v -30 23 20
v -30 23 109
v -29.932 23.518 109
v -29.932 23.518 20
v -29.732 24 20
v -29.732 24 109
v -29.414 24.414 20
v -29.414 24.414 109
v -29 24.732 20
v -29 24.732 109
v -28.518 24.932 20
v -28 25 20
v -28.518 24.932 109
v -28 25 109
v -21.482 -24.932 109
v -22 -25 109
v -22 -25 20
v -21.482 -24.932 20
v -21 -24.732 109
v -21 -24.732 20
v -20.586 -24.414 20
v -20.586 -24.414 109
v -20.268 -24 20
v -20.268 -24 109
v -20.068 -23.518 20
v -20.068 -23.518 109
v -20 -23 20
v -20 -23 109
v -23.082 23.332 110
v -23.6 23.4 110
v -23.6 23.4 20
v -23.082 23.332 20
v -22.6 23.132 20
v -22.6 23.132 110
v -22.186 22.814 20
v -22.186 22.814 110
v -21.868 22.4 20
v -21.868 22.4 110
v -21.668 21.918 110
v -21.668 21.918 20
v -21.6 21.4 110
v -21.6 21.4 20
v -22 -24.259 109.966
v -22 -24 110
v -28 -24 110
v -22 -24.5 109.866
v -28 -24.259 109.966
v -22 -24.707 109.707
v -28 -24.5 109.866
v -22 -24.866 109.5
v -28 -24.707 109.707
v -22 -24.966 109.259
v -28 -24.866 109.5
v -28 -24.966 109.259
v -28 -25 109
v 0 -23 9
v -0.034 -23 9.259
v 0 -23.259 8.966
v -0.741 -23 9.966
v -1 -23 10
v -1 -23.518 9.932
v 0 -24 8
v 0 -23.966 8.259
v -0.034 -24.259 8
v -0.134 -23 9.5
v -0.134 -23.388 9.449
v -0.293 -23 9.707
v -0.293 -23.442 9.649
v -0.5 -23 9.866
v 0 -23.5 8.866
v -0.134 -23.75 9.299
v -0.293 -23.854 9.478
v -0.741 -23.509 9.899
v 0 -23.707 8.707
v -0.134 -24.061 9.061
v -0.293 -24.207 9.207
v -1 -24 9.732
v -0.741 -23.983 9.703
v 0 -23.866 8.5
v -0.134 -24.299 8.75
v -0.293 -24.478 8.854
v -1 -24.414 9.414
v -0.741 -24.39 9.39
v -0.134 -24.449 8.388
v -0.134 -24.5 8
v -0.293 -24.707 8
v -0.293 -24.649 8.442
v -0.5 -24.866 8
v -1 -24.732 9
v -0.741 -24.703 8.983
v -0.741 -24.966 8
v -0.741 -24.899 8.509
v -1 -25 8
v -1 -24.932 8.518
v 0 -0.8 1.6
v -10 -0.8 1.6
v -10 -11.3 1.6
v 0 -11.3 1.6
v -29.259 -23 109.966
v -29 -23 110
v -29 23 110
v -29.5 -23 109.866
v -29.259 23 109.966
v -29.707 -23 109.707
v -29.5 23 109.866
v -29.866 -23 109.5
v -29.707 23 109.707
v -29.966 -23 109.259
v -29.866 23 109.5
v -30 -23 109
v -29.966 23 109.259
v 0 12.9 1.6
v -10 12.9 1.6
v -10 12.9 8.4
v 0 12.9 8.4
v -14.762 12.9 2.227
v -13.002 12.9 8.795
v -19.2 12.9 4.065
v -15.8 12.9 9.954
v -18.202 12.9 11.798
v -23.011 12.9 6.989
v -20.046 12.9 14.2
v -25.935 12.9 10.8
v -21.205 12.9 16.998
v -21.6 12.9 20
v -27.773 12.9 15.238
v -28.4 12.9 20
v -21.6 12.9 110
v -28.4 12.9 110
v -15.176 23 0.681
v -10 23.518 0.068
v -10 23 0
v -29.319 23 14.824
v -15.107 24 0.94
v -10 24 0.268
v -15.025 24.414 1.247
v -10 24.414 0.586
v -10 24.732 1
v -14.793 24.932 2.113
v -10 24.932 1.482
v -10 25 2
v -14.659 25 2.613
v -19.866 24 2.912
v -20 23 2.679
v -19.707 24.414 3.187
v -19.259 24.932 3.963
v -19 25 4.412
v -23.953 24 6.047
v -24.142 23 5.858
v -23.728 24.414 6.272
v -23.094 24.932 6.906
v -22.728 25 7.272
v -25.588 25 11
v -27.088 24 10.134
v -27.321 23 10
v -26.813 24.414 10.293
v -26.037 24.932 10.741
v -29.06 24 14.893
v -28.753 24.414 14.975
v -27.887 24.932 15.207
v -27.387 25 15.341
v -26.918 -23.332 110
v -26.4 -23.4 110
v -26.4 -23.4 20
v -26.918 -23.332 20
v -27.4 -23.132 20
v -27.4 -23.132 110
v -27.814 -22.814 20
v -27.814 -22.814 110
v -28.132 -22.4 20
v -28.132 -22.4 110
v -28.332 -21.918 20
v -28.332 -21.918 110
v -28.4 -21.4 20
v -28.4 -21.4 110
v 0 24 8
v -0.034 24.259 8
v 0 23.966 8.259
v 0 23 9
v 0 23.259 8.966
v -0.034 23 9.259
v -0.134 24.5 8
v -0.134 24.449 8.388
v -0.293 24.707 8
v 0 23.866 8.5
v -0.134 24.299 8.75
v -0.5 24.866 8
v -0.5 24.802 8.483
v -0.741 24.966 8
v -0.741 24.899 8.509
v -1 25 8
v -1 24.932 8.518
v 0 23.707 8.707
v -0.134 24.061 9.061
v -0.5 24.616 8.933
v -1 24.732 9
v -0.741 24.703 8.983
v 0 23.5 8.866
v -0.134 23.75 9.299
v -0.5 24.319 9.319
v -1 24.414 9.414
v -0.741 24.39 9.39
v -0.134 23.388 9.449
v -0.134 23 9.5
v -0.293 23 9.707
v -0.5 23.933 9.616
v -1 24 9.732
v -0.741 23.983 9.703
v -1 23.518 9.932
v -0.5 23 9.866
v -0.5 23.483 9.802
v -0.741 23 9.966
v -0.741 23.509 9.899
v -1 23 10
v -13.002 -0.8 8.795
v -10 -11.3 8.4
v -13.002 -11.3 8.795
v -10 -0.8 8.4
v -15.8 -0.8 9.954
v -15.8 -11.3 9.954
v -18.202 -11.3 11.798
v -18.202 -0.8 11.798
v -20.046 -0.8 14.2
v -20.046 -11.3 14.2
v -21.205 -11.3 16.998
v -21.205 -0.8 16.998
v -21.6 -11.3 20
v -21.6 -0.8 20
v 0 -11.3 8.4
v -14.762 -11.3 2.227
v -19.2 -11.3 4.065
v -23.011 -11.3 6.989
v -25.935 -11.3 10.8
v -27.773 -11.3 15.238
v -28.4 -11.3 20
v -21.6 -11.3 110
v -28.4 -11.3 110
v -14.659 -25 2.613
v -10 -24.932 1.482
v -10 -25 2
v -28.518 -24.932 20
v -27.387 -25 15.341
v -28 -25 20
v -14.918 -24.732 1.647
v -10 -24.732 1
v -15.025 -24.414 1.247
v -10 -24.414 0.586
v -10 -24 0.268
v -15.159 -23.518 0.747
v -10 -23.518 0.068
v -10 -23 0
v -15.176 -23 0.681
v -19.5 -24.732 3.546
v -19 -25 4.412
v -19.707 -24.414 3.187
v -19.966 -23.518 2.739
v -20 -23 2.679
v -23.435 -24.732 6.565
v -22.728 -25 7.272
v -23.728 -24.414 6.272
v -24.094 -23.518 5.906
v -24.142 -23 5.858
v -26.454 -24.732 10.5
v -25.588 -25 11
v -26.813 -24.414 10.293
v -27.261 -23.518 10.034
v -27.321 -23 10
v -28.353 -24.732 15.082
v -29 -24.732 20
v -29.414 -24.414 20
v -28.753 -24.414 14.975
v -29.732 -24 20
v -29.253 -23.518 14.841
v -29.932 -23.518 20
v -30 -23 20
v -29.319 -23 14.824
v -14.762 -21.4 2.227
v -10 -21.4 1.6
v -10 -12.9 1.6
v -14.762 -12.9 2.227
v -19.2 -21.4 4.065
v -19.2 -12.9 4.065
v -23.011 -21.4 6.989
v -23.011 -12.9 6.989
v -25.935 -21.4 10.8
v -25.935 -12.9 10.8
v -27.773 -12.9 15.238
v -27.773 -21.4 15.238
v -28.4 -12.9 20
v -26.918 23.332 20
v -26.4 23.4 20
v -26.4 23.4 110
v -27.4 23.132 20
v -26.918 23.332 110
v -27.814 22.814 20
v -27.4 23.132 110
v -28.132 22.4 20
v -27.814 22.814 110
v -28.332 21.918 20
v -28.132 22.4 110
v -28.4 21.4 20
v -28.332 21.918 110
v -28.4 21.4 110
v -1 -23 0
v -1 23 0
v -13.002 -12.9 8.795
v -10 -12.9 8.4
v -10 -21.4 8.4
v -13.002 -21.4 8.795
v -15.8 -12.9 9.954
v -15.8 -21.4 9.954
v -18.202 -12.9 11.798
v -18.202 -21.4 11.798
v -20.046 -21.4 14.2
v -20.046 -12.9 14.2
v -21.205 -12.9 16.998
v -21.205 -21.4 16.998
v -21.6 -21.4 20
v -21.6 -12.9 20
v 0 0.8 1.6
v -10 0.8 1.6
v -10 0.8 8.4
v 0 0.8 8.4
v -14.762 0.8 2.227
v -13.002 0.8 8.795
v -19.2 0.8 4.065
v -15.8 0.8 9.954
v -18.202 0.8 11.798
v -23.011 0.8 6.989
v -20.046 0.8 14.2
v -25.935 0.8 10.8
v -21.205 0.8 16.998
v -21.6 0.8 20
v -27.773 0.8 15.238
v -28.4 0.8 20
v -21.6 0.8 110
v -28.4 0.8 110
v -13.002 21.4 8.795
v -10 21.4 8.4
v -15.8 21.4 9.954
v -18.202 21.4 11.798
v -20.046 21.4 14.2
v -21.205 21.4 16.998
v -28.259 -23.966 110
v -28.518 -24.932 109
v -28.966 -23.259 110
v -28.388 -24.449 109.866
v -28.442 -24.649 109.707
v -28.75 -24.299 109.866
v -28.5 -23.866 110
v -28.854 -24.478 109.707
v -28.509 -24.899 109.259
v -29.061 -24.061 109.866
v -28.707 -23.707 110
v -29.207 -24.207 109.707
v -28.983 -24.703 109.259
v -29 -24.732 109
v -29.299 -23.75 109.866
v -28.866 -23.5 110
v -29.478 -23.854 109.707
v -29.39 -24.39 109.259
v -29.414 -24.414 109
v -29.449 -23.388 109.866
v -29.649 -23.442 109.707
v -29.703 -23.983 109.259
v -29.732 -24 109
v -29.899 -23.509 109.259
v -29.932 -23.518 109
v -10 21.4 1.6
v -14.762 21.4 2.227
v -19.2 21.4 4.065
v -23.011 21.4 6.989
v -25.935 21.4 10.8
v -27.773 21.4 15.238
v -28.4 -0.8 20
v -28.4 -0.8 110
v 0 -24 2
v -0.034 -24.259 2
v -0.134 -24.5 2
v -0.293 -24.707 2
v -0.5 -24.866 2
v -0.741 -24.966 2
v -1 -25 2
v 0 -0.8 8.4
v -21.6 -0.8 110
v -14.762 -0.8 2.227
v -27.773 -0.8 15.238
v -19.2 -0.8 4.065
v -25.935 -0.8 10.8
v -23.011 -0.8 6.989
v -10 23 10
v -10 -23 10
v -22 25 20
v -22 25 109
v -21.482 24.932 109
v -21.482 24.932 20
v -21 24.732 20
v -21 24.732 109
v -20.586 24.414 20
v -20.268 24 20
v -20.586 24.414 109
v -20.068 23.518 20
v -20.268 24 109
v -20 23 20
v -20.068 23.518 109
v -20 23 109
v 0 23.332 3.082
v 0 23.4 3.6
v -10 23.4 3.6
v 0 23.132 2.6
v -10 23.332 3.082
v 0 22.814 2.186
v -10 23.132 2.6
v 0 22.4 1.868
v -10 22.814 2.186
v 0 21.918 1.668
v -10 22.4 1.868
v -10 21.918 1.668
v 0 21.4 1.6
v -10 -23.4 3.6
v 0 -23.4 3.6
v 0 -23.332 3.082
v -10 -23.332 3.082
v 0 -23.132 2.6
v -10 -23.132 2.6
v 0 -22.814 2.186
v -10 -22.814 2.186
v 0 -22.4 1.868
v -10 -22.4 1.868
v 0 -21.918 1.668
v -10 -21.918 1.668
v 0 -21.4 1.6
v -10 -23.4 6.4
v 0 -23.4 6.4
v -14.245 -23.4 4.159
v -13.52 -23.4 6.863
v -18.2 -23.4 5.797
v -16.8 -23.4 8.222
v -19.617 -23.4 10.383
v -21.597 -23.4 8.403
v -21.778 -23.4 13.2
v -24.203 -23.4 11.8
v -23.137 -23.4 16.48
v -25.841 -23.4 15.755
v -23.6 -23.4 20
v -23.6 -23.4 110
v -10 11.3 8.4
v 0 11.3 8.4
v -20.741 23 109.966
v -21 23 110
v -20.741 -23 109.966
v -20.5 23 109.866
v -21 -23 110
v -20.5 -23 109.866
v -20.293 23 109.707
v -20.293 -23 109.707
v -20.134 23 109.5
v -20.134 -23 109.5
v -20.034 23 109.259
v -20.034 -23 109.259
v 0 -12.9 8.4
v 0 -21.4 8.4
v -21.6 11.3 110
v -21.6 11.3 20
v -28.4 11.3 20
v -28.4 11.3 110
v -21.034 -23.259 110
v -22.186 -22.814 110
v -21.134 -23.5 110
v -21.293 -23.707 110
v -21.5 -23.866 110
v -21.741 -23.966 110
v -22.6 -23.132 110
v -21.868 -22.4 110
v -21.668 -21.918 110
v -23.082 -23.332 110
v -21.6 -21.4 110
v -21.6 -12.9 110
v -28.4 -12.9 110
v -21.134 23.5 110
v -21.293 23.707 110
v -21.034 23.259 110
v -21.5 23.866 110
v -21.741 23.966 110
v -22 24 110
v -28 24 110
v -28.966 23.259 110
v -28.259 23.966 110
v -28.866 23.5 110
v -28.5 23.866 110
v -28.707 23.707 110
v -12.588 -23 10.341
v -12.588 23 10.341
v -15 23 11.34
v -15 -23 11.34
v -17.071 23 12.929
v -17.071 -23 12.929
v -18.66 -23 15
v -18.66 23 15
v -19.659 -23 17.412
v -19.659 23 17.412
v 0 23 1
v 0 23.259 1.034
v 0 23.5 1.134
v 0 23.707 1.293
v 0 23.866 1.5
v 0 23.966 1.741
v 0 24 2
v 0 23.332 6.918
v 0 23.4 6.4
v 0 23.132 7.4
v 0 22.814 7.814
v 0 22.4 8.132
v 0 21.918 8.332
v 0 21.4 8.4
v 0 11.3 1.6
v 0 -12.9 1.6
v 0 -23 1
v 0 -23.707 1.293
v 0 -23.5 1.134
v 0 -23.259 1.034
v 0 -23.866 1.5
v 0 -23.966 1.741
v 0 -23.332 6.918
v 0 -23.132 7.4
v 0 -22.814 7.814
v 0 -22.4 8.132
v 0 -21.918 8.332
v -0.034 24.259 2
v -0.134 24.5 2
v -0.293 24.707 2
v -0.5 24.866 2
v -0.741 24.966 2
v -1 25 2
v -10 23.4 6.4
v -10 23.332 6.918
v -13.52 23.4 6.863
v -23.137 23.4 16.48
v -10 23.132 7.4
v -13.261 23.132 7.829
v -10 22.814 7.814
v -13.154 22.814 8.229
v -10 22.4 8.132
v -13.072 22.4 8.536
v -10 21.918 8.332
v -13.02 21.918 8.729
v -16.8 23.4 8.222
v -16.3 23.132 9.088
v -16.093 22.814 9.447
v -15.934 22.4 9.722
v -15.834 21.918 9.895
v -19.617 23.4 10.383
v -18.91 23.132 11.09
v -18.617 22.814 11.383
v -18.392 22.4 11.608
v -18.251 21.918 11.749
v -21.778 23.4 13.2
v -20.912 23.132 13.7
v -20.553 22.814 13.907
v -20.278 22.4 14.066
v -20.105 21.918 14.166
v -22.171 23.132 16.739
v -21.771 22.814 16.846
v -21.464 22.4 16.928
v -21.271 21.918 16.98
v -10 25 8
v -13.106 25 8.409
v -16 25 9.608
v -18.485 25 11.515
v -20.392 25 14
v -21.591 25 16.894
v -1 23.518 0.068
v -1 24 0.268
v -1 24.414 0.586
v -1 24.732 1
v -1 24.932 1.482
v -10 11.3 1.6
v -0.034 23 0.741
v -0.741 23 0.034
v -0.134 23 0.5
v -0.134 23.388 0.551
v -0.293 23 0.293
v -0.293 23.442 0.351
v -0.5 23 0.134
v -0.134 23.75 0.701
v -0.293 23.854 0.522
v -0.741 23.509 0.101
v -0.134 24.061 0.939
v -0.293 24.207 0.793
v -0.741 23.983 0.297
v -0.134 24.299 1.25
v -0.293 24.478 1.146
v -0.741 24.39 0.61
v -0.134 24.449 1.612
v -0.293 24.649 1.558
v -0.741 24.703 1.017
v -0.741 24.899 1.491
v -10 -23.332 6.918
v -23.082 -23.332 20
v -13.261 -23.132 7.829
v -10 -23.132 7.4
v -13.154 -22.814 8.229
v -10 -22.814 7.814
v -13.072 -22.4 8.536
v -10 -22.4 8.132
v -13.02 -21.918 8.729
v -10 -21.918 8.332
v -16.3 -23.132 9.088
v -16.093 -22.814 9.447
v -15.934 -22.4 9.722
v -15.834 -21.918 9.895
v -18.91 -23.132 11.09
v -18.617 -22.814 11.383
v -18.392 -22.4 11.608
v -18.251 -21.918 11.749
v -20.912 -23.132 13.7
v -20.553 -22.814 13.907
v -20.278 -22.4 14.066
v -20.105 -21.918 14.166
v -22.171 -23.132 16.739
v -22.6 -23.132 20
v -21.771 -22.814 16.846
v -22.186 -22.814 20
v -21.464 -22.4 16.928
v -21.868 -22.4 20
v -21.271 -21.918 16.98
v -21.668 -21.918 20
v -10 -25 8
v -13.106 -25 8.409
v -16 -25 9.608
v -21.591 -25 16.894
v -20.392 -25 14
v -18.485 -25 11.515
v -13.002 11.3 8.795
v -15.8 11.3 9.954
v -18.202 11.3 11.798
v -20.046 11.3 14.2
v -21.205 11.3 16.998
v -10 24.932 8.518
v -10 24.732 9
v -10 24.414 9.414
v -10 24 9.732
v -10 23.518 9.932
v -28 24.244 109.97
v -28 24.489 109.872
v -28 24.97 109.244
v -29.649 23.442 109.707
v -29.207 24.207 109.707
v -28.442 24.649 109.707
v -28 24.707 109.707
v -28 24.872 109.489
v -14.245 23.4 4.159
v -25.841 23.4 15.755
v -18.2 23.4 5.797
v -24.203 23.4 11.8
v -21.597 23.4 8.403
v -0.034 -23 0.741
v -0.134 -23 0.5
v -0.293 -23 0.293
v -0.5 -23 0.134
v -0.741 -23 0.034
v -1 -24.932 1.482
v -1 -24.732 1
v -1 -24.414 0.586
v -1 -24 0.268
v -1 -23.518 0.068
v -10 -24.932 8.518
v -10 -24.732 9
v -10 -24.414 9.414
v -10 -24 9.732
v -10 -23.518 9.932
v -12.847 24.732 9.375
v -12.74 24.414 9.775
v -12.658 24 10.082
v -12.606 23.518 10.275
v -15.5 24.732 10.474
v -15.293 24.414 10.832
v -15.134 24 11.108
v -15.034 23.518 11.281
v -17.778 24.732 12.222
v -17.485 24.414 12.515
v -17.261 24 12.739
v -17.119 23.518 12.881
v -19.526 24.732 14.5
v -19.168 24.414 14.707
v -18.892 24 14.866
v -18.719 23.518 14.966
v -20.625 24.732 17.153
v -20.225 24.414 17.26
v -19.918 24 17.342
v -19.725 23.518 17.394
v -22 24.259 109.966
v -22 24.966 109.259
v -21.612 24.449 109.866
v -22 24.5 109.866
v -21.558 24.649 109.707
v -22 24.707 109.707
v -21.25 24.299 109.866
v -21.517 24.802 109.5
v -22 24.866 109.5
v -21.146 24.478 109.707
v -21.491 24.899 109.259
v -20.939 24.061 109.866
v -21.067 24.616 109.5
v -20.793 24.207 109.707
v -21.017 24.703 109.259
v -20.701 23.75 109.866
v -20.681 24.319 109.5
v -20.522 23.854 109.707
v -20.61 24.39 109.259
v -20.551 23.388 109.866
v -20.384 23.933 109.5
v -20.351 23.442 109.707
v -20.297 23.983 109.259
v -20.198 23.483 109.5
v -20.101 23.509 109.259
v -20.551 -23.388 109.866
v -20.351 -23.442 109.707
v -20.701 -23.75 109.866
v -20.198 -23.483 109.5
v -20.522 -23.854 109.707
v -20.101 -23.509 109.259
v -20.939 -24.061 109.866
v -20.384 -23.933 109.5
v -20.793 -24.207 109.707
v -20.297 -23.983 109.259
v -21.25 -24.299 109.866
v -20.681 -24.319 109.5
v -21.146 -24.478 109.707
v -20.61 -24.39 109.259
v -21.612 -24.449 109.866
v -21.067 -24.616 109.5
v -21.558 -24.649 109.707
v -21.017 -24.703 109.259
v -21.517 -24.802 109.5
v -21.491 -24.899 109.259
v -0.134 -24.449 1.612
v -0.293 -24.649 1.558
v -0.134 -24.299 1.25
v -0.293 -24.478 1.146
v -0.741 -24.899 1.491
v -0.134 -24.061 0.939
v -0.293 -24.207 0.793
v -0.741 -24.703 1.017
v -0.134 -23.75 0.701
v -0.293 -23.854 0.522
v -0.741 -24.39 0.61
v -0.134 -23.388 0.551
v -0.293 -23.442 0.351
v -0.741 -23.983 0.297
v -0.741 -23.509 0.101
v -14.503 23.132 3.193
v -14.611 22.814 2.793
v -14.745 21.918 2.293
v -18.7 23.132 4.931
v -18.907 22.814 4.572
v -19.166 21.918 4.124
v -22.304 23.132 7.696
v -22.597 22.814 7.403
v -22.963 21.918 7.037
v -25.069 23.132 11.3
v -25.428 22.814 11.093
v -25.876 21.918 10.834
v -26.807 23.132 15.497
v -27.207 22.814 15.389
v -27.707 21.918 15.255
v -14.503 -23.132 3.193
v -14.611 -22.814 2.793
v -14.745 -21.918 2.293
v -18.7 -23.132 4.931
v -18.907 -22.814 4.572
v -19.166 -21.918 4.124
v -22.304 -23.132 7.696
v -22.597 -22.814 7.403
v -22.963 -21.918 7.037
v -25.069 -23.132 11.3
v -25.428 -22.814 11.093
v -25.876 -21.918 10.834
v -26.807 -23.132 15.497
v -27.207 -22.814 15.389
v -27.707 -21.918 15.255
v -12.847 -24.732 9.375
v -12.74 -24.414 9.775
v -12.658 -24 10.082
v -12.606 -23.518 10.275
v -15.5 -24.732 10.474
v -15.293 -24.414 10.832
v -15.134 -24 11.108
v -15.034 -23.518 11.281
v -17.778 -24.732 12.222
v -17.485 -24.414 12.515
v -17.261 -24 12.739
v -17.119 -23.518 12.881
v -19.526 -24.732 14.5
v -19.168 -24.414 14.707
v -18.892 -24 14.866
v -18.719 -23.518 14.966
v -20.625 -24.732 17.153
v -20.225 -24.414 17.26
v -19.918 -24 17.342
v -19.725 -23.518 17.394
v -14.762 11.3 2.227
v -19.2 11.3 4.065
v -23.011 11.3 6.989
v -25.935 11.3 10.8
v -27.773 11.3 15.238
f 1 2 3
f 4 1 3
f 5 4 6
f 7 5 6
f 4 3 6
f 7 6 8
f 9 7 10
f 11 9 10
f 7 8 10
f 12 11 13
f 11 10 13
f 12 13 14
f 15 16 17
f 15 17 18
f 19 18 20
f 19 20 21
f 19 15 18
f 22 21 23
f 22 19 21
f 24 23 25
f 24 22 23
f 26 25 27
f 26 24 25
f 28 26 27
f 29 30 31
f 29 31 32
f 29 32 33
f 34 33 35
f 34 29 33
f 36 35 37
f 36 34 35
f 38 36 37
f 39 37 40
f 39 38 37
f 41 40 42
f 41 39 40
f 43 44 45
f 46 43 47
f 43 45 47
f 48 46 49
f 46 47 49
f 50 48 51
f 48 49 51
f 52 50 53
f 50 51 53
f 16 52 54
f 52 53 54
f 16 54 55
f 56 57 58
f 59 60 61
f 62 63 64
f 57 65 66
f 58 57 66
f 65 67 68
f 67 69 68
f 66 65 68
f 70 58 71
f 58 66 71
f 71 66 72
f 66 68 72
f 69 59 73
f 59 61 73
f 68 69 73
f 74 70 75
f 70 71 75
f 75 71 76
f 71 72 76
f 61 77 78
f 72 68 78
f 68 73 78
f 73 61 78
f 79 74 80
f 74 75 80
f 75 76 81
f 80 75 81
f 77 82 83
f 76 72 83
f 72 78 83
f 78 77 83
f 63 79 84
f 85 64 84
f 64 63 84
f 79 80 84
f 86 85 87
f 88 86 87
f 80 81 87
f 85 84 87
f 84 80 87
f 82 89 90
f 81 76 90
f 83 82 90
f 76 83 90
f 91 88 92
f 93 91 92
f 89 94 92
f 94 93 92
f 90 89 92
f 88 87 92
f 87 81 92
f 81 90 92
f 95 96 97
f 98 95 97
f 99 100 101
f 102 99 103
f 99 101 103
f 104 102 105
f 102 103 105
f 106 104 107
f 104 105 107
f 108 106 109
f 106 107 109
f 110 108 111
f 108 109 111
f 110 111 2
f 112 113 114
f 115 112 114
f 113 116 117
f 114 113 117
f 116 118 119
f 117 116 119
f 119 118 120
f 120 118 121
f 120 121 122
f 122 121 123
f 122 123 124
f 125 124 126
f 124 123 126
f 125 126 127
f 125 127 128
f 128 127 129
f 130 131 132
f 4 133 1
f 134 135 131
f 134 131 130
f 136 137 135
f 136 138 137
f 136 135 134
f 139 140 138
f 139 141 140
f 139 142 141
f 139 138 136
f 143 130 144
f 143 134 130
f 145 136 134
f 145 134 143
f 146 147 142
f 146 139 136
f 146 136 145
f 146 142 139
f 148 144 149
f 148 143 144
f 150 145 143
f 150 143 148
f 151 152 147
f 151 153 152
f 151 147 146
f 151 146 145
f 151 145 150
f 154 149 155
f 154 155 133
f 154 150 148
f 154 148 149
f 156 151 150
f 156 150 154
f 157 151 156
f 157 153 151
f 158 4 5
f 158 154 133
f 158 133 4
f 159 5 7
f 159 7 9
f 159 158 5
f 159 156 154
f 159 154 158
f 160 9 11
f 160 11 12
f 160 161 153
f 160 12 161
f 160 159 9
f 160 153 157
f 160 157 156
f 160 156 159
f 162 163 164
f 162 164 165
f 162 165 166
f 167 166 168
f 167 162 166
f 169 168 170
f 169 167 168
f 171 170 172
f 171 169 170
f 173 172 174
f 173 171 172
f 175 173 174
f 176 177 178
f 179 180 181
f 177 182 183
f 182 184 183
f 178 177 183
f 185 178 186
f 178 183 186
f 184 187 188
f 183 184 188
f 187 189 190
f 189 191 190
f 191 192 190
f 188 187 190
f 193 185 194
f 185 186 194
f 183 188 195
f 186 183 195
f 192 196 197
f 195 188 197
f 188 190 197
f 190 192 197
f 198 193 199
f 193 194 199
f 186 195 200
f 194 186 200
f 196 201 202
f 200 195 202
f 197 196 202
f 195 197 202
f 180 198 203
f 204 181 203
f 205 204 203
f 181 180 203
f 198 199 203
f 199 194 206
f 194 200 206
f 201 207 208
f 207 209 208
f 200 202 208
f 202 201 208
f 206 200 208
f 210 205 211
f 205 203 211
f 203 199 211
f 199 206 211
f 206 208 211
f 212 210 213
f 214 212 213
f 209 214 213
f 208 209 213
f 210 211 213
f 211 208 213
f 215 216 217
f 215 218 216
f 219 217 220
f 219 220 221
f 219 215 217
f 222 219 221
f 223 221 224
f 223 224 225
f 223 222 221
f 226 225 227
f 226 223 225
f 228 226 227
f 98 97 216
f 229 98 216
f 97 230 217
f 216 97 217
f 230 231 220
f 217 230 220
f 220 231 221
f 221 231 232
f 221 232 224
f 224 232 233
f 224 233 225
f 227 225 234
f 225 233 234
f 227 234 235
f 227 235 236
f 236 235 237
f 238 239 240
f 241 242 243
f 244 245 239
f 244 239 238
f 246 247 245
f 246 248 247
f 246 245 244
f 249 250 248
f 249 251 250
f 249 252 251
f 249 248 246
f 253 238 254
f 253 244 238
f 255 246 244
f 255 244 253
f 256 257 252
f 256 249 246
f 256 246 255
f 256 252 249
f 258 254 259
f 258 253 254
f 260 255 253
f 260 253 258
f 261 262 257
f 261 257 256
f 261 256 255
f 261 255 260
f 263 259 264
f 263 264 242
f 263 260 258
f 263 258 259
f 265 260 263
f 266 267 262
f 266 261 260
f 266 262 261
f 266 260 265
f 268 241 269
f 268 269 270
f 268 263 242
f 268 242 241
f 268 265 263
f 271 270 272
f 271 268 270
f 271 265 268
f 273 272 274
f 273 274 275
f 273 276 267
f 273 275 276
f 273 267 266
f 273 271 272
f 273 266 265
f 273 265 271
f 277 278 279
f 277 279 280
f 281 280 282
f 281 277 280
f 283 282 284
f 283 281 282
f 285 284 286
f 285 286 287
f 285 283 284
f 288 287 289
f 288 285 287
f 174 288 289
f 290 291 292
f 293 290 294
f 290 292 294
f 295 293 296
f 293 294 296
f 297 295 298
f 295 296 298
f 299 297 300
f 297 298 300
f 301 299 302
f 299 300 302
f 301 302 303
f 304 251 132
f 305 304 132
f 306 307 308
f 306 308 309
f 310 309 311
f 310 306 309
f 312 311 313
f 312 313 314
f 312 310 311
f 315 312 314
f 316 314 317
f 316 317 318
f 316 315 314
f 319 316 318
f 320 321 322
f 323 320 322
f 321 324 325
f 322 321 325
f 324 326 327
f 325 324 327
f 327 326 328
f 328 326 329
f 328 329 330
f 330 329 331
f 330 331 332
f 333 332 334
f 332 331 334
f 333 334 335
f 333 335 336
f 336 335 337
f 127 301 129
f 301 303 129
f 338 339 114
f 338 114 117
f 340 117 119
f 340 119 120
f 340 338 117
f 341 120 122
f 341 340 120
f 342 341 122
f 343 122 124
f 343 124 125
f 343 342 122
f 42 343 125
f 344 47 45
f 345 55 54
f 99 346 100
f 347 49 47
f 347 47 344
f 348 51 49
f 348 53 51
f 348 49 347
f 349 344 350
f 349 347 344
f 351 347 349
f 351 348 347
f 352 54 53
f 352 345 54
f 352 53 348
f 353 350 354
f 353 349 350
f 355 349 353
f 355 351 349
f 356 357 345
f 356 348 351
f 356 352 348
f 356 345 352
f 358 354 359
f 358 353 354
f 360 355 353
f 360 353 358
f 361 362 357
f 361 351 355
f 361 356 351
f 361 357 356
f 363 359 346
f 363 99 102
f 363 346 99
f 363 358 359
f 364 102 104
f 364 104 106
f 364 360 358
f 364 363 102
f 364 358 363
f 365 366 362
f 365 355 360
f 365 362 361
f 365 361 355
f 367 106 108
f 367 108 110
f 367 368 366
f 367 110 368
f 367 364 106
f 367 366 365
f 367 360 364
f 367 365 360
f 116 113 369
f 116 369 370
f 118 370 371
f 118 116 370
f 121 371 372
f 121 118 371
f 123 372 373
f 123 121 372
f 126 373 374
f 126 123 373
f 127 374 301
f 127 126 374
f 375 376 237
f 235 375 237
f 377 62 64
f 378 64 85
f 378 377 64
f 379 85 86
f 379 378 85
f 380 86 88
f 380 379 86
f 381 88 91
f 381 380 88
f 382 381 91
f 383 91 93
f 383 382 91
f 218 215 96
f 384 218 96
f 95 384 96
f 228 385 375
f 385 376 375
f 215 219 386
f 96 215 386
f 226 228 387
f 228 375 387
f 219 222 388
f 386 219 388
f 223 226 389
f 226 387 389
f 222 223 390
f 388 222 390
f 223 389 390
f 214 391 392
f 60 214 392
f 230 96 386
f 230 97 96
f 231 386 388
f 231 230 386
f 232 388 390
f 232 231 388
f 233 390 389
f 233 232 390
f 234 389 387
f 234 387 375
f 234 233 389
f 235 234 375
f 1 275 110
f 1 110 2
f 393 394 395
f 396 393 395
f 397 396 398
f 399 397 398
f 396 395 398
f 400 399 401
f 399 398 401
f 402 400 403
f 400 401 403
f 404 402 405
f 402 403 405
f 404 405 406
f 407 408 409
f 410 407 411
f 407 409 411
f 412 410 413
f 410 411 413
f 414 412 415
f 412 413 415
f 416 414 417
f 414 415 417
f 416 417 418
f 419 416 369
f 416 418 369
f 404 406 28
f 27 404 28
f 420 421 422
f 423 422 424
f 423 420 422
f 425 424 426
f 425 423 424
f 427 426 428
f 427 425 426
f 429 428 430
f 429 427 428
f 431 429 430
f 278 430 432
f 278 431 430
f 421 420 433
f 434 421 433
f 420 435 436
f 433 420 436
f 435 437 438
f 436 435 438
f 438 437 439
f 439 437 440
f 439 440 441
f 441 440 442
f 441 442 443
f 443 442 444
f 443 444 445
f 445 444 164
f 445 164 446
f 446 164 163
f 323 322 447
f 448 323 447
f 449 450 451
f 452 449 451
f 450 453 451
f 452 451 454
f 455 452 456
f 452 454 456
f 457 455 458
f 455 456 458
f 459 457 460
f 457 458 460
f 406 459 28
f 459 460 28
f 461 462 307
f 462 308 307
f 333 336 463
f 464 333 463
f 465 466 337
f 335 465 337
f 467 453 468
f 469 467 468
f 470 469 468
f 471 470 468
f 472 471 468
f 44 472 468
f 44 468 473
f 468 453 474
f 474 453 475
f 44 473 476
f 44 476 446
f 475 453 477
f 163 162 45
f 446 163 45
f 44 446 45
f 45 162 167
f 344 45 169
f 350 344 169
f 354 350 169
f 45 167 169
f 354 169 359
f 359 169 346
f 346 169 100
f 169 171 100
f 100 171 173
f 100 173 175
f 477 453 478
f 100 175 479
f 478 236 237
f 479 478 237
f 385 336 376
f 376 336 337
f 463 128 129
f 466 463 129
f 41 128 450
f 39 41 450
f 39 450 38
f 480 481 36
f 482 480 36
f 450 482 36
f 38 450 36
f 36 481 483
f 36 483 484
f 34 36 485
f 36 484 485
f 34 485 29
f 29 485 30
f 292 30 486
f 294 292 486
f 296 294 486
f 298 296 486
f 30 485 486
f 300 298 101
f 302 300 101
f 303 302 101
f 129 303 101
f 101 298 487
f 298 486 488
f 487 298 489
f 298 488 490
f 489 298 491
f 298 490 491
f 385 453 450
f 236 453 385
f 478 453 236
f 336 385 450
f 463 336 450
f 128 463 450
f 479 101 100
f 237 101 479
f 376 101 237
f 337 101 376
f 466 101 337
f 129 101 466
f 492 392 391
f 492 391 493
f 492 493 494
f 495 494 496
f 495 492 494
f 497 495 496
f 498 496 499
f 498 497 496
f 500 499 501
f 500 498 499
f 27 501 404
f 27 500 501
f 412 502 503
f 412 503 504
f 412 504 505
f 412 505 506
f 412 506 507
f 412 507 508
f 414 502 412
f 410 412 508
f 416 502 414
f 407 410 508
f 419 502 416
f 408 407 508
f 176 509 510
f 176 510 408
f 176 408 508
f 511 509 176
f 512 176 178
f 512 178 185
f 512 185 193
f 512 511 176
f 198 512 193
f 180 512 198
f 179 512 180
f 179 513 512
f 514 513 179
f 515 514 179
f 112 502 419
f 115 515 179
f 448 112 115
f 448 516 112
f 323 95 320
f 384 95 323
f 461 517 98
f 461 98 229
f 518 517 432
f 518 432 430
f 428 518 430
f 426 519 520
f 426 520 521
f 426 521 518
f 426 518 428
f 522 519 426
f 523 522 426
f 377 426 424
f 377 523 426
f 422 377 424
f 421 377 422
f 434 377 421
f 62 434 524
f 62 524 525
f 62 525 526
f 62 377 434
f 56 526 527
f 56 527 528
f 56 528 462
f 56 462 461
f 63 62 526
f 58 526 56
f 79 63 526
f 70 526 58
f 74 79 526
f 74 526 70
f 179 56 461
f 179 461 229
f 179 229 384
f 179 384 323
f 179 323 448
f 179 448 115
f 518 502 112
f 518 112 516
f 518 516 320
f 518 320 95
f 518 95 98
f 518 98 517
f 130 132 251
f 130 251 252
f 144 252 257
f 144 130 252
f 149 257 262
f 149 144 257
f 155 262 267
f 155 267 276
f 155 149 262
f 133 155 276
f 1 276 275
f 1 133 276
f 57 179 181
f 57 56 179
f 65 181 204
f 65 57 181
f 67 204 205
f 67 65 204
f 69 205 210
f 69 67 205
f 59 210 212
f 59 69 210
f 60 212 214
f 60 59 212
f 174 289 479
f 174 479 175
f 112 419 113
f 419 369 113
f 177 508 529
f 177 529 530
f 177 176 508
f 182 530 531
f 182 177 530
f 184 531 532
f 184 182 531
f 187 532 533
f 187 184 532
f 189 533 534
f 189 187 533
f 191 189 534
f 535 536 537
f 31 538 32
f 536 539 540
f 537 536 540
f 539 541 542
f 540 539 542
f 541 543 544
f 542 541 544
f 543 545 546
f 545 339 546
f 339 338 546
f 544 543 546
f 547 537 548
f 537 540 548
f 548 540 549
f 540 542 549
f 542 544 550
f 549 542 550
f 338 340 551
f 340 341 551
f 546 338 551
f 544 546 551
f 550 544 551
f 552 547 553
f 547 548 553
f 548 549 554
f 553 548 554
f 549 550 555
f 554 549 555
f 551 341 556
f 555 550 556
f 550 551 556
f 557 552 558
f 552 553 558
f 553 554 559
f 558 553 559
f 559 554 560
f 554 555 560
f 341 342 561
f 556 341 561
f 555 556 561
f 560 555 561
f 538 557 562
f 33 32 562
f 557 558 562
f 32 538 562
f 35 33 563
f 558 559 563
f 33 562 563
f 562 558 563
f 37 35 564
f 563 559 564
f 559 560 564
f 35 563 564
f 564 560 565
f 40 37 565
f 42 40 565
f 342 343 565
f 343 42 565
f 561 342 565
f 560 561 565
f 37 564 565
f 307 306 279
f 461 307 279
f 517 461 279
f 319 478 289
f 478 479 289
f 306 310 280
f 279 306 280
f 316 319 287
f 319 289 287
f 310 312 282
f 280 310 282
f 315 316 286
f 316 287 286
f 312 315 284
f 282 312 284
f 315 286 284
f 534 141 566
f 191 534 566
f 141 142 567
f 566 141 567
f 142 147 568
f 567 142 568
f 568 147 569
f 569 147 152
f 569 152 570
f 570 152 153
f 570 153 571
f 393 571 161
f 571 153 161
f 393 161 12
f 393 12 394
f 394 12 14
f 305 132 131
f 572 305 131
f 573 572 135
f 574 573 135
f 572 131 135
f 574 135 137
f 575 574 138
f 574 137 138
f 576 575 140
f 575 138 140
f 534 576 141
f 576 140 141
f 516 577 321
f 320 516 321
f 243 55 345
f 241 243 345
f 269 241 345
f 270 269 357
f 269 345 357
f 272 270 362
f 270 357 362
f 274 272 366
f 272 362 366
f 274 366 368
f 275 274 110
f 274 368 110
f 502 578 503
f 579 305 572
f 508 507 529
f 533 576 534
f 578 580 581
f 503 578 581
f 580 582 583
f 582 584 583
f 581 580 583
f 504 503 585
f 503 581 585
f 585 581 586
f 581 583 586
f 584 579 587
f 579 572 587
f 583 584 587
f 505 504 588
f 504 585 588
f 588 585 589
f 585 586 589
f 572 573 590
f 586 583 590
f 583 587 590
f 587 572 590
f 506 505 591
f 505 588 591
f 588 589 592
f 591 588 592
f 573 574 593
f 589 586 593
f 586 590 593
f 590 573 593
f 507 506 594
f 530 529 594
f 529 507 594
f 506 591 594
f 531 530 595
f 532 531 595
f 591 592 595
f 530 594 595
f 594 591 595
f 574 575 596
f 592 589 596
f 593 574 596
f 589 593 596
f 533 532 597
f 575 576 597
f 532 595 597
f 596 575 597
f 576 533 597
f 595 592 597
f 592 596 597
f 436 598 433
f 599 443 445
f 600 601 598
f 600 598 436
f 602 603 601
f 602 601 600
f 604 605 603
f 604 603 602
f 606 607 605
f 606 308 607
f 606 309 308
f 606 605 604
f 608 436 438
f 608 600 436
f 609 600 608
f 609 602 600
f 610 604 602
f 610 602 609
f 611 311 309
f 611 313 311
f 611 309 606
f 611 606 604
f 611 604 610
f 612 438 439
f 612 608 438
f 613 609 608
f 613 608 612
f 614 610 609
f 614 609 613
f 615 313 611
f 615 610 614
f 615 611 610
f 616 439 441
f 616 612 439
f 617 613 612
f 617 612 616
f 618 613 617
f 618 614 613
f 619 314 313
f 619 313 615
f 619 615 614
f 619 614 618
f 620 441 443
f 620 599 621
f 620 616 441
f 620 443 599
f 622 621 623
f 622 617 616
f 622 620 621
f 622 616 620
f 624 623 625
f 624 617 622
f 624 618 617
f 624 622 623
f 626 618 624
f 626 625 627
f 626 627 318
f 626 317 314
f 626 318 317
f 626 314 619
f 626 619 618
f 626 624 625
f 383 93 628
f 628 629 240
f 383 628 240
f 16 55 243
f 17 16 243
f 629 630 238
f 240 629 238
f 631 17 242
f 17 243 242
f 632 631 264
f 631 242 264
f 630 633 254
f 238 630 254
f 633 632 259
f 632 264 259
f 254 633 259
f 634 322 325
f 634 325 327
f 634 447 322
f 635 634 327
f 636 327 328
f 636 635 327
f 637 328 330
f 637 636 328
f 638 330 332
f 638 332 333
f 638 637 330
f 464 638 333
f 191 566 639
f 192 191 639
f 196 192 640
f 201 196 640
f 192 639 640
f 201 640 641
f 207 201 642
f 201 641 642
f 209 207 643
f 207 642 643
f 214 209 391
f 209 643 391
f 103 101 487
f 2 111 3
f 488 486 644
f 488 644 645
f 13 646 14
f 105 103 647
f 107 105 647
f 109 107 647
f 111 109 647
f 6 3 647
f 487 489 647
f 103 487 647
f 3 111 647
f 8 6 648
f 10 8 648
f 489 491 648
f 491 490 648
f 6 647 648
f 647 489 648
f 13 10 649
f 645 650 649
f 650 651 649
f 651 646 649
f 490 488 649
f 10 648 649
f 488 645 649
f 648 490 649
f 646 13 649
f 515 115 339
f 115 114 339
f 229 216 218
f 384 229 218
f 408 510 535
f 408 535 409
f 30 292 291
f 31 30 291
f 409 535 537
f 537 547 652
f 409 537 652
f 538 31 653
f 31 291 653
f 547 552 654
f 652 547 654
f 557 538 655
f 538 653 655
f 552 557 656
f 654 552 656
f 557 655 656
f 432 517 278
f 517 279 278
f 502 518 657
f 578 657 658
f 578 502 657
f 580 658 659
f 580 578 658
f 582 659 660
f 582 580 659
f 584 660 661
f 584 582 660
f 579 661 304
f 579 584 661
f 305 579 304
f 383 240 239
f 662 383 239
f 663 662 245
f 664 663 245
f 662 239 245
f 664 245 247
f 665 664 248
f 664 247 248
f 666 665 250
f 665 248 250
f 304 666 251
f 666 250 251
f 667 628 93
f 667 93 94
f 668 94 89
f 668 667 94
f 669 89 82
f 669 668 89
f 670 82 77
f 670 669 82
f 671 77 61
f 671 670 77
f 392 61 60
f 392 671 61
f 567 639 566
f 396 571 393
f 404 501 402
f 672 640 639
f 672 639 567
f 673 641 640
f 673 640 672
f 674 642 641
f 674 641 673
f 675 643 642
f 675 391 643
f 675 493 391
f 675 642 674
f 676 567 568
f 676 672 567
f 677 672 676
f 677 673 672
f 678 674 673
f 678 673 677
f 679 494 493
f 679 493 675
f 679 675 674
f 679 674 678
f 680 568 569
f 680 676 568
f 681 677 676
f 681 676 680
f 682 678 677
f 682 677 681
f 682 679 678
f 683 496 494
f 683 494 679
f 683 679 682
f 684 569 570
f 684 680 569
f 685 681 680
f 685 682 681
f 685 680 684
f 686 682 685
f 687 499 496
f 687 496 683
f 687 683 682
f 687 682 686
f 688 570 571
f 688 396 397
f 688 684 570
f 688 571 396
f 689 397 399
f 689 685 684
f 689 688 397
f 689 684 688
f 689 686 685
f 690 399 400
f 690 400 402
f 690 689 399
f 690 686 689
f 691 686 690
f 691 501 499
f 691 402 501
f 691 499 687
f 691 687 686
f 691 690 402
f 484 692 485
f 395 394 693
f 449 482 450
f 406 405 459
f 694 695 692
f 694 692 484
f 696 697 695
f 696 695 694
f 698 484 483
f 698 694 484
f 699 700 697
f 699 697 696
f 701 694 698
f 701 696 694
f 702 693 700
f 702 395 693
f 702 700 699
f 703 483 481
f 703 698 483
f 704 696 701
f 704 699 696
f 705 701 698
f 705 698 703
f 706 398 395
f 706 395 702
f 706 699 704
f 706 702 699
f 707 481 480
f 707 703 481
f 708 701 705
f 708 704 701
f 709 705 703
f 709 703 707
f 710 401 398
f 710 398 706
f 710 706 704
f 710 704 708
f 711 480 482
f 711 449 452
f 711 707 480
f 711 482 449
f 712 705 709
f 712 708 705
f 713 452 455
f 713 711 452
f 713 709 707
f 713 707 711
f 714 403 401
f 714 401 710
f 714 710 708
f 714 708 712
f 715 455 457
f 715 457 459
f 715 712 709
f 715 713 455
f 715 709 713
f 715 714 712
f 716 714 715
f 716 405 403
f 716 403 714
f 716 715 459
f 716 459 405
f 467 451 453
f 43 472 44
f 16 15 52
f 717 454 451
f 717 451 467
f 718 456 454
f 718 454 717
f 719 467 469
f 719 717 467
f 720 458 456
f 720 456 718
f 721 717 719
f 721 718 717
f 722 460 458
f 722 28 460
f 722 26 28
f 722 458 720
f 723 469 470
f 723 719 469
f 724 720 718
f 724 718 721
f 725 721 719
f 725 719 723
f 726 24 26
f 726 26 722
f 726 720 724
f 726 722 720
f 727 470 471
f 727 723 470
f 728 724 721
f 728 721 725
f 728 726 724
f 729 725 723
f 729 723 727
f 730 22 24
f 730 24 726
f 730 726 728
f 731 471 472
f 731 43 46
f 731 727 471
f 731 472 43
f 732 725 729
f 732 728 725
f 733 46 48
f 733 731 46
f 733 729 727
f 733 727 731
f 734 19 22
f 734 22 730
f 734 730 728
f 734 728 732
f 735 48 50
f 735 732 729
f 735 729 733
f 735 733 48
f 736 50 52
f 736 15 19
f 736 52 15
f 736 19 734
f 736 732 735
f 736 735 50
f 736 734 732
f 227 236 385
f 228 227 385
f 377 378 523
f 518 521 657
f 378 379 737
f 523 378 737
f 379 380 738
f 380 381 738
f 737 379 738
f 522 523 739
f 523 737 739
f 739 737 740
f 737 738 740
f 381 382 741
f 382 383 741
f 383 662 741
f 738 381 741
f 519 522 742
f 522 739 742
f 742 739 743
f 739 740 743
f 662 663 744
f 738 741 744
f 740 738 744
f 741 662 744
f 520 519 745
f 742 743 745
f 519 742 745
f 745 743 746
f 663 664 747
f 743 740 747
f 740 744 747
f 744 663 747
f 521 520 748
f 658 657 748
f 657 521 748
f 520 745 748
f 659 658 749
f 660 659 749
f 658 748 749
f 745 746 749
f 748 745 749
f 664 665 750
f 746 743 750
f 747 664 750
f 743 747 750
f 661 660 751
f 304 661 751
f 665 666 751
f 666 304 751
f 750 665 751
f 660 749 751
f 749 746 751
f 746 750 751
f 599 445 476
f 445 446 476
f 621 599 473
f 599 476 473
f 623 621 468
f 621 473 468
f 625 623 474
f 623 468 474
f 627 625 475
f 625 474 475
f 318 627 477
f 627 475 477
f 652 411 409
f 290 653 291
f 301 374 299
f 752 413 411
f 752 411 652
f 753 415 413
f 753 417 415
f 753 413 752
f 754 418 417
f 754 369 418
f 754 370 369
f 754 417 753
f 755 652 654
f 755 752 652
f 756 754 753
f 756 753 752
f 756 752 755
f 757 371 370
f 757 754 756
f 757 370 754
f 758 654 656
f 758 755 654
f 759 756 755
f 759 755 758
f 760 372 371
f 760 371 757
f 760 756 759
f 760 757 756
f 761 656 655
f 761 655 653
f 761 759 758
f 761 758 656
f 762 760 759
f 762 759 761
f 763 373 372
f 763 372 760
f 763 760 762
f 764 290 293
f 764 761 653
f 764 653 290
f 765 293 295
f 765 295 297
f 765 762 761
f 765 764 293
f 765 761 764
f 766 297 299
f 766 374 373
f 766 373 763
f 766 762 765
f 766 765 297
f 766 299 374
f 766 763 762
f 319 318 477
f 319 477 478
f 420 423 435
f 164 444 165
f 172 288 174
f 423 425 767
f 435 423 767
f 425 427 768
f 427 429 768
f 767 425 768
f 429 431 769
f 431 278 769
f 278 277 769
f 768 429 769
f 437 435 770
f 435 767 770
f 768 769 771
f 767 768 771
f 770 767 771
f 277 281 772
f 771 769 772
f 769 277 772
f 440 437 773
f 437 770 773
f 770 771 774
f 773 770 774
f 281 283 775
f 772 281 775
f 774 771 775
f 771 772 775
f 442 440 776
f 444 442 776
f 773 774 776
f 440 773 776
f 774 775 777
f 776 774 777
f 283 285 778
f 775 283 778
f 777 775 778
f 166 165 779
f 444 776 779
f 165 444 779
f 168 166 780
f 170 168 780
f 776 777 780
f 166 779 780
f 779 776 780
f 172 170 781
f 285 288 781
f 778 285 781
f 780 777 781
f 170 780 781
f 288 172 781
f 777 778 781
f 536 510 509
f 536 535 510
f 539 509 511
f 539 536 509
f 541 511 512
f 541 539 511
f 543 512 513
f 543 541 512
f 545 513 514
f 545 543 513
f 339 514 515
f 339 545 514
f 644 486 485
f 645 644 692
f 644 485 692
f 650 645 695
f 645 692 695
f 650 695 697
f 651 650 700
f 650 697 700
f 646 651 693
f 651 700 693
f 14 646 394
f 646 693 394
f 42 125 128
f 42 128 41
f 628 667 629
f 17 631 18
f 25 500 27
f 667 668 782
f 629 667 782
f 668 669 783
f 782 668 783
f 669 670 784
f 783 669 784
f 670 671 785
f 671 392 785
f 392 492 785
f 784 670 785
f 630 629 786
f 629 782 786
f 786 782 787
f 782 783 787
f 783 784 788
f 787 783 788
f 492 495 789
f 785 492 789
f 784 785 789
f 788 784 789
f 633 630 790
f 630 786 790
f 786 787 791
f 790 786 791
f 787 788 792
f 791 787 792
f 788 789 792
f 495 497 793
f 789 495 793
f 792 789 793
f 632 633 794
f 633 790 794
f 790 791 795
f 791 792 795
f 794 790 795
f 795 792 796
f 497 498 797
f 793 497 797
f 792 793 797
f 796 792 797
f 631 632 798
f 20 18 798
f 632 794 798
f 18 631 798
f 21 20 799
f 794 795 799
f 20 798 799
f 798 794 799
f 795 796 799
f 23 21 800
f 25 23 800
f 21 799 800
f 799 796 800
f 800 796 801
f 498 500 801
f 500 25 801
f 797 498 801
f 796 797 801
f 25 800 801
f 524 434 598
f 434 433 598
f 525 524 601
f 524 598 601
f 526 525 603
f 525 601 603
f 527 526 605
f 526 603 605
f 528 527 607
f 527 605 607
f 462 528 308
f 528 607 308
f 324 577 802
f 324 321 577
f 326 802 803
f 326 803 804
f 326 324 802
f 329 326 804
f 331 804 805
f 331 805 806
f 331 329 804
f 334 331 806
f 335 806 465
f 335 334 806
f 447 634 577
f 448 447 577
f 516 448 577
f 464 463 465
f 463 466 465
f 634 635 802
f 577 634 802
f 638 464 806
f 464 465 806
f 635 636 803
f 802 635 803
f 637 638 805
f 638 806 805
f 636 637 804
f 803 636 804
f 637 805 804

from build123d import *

# Parameters (mm, degrees)
SKETCH_W    = 50
SKETCH_H    = 10
SKETCH_W_2  = 10.5
SKETCH_H_2  = 6.8
FILLET_R    = 2
FILLET001_R = 2
FILLET002_R = 2
FILLET003_R = 2
FILLET004_R = 1
FILLET005_R = 1


with BuildPart() as part:
    # AdditivePipe: sweep along a path in Sketch001
    with BuildLine(Plane.XZ) as additivepipe_path:
        Line((0, 0), (-10, 0))
        ThreePointArc((-10, 0), (-24.142136, 5.857864), (-30, 20))
        Line((-30, 20), (-30, 110))
    # Sketch → AdditivePipe (sweep)
    with BuildSketch(Plane.YZ):
        with Locations((0, 5)):
            Rectangle(SKETCH_W, SKETCH_H)
        with Locations((-18.15, 5)):
            Rectangle(SKETCH_W_2, SKETCH_H_2, mode=Mode.SUBTRACT)
        with Locations((-6.05, 5)):
            Rectangle(SKETCH_W_2, SKETCH_H_2, mode=Mode.SUBTRACT)
        with Locations((6.05, 5)):
            Rectangle(SKETCH_W_2, SKETCH_H_2, mode=Mode.SUBTRACT)
        with Locations((18.15, 5)):
            Rectangle(SKETCH_W_2, SKETCH_H_2, mode=Mode.SUBTRACT)
    sweep(path=additivepipe_path.line)

    # Fillet
    fillet_edges = [part.edges().sort_by_distance(p)[0] for p in [
        (-20, -25, 65),
        (-17.071068, -25, 12.928932),
        (-5, -25, 10),
        (-20, 25, 65),
        (-17.071068, 25, 12.928932),
        (-5, 25, 10),
    ]]
    fillet(fillet_edges, radius=FILLET_R)

    # Fillet001
    fillet001_edges = [part.edges().sort_by_distance(p)[0] for p in [
        (-5, 25, 0),
        (-24.142136, 25, 5.857864),
        (-30, 25, 65),
        (-30, -25, 65),
        (-24.142136, -25, 5.857864),
        (-5, -25, 0),
    ]]
    fillet(fillet001_edges, radius=FILLET001_R)

    # Fillet002
    fillet002_edges = [part.edges().sort_by_distance(p)[0] for p in [
        (-28.4, -23.4, 65),
        (-21.6, -23.4, 65),
        (-23.010765, -23.4, 6.989235),
        (-18.202439, -23.4, 11.797561),
        (-5, -23.4, 8.4),
        (-5, -23.4, 1.6),
    ]]
    fillet(fillet002_edges, radius=FILLET002_R)

    # Fillet003
    fillet003_edges = [part.edges().sort_by_distance(p)[0] for p in [
        (-28.4, 23.4, 65),
        (-21.6, 23.4, 65),
        (-23.010765, 23.4, 6.989235),
        (-18.202439, 23.4, 11.797561),
        (-5, 23.4, 8.4),
        (-5, 23.4, 1.6),
    ]]
    fillet(fillet003_edges, radius=FILLET003_R)

    # Fillet004
    fillet004_edges = [part.edges().sort_by_distance(p)[0] for p in [
        (0, 0, 10),
        (0, -24.414214, 9.414214),
        (0, -25, 5),
        (0, -24.414214, 0.585786),
        (0, 0, 0),
        (0, 24.414214, 0.585786),
        (0, 25, 5),
        (0, 24.414214, 9.414214),
    ]]
    fillet(fillet004_edges, radius=FILLET004_R)

    # Fillet005
    fillet005_edges = [part.edges().sort_by_distance(p)[0] for p in [
        (-20, 0, 110),
        (-20.585786, -24.414214, 110),
        (-25, -25, 110),
        (-29.414214, -24.414214, 110),
        (-30, 0, 110),
        (-29.414214, 24.414214, 110),
        (-25, 25, 110),
        (-20.585786, 24.414214, 110),
    ]]
    fillet(fillet005_edges, radius=FILLET005_R)


solid = part.part
